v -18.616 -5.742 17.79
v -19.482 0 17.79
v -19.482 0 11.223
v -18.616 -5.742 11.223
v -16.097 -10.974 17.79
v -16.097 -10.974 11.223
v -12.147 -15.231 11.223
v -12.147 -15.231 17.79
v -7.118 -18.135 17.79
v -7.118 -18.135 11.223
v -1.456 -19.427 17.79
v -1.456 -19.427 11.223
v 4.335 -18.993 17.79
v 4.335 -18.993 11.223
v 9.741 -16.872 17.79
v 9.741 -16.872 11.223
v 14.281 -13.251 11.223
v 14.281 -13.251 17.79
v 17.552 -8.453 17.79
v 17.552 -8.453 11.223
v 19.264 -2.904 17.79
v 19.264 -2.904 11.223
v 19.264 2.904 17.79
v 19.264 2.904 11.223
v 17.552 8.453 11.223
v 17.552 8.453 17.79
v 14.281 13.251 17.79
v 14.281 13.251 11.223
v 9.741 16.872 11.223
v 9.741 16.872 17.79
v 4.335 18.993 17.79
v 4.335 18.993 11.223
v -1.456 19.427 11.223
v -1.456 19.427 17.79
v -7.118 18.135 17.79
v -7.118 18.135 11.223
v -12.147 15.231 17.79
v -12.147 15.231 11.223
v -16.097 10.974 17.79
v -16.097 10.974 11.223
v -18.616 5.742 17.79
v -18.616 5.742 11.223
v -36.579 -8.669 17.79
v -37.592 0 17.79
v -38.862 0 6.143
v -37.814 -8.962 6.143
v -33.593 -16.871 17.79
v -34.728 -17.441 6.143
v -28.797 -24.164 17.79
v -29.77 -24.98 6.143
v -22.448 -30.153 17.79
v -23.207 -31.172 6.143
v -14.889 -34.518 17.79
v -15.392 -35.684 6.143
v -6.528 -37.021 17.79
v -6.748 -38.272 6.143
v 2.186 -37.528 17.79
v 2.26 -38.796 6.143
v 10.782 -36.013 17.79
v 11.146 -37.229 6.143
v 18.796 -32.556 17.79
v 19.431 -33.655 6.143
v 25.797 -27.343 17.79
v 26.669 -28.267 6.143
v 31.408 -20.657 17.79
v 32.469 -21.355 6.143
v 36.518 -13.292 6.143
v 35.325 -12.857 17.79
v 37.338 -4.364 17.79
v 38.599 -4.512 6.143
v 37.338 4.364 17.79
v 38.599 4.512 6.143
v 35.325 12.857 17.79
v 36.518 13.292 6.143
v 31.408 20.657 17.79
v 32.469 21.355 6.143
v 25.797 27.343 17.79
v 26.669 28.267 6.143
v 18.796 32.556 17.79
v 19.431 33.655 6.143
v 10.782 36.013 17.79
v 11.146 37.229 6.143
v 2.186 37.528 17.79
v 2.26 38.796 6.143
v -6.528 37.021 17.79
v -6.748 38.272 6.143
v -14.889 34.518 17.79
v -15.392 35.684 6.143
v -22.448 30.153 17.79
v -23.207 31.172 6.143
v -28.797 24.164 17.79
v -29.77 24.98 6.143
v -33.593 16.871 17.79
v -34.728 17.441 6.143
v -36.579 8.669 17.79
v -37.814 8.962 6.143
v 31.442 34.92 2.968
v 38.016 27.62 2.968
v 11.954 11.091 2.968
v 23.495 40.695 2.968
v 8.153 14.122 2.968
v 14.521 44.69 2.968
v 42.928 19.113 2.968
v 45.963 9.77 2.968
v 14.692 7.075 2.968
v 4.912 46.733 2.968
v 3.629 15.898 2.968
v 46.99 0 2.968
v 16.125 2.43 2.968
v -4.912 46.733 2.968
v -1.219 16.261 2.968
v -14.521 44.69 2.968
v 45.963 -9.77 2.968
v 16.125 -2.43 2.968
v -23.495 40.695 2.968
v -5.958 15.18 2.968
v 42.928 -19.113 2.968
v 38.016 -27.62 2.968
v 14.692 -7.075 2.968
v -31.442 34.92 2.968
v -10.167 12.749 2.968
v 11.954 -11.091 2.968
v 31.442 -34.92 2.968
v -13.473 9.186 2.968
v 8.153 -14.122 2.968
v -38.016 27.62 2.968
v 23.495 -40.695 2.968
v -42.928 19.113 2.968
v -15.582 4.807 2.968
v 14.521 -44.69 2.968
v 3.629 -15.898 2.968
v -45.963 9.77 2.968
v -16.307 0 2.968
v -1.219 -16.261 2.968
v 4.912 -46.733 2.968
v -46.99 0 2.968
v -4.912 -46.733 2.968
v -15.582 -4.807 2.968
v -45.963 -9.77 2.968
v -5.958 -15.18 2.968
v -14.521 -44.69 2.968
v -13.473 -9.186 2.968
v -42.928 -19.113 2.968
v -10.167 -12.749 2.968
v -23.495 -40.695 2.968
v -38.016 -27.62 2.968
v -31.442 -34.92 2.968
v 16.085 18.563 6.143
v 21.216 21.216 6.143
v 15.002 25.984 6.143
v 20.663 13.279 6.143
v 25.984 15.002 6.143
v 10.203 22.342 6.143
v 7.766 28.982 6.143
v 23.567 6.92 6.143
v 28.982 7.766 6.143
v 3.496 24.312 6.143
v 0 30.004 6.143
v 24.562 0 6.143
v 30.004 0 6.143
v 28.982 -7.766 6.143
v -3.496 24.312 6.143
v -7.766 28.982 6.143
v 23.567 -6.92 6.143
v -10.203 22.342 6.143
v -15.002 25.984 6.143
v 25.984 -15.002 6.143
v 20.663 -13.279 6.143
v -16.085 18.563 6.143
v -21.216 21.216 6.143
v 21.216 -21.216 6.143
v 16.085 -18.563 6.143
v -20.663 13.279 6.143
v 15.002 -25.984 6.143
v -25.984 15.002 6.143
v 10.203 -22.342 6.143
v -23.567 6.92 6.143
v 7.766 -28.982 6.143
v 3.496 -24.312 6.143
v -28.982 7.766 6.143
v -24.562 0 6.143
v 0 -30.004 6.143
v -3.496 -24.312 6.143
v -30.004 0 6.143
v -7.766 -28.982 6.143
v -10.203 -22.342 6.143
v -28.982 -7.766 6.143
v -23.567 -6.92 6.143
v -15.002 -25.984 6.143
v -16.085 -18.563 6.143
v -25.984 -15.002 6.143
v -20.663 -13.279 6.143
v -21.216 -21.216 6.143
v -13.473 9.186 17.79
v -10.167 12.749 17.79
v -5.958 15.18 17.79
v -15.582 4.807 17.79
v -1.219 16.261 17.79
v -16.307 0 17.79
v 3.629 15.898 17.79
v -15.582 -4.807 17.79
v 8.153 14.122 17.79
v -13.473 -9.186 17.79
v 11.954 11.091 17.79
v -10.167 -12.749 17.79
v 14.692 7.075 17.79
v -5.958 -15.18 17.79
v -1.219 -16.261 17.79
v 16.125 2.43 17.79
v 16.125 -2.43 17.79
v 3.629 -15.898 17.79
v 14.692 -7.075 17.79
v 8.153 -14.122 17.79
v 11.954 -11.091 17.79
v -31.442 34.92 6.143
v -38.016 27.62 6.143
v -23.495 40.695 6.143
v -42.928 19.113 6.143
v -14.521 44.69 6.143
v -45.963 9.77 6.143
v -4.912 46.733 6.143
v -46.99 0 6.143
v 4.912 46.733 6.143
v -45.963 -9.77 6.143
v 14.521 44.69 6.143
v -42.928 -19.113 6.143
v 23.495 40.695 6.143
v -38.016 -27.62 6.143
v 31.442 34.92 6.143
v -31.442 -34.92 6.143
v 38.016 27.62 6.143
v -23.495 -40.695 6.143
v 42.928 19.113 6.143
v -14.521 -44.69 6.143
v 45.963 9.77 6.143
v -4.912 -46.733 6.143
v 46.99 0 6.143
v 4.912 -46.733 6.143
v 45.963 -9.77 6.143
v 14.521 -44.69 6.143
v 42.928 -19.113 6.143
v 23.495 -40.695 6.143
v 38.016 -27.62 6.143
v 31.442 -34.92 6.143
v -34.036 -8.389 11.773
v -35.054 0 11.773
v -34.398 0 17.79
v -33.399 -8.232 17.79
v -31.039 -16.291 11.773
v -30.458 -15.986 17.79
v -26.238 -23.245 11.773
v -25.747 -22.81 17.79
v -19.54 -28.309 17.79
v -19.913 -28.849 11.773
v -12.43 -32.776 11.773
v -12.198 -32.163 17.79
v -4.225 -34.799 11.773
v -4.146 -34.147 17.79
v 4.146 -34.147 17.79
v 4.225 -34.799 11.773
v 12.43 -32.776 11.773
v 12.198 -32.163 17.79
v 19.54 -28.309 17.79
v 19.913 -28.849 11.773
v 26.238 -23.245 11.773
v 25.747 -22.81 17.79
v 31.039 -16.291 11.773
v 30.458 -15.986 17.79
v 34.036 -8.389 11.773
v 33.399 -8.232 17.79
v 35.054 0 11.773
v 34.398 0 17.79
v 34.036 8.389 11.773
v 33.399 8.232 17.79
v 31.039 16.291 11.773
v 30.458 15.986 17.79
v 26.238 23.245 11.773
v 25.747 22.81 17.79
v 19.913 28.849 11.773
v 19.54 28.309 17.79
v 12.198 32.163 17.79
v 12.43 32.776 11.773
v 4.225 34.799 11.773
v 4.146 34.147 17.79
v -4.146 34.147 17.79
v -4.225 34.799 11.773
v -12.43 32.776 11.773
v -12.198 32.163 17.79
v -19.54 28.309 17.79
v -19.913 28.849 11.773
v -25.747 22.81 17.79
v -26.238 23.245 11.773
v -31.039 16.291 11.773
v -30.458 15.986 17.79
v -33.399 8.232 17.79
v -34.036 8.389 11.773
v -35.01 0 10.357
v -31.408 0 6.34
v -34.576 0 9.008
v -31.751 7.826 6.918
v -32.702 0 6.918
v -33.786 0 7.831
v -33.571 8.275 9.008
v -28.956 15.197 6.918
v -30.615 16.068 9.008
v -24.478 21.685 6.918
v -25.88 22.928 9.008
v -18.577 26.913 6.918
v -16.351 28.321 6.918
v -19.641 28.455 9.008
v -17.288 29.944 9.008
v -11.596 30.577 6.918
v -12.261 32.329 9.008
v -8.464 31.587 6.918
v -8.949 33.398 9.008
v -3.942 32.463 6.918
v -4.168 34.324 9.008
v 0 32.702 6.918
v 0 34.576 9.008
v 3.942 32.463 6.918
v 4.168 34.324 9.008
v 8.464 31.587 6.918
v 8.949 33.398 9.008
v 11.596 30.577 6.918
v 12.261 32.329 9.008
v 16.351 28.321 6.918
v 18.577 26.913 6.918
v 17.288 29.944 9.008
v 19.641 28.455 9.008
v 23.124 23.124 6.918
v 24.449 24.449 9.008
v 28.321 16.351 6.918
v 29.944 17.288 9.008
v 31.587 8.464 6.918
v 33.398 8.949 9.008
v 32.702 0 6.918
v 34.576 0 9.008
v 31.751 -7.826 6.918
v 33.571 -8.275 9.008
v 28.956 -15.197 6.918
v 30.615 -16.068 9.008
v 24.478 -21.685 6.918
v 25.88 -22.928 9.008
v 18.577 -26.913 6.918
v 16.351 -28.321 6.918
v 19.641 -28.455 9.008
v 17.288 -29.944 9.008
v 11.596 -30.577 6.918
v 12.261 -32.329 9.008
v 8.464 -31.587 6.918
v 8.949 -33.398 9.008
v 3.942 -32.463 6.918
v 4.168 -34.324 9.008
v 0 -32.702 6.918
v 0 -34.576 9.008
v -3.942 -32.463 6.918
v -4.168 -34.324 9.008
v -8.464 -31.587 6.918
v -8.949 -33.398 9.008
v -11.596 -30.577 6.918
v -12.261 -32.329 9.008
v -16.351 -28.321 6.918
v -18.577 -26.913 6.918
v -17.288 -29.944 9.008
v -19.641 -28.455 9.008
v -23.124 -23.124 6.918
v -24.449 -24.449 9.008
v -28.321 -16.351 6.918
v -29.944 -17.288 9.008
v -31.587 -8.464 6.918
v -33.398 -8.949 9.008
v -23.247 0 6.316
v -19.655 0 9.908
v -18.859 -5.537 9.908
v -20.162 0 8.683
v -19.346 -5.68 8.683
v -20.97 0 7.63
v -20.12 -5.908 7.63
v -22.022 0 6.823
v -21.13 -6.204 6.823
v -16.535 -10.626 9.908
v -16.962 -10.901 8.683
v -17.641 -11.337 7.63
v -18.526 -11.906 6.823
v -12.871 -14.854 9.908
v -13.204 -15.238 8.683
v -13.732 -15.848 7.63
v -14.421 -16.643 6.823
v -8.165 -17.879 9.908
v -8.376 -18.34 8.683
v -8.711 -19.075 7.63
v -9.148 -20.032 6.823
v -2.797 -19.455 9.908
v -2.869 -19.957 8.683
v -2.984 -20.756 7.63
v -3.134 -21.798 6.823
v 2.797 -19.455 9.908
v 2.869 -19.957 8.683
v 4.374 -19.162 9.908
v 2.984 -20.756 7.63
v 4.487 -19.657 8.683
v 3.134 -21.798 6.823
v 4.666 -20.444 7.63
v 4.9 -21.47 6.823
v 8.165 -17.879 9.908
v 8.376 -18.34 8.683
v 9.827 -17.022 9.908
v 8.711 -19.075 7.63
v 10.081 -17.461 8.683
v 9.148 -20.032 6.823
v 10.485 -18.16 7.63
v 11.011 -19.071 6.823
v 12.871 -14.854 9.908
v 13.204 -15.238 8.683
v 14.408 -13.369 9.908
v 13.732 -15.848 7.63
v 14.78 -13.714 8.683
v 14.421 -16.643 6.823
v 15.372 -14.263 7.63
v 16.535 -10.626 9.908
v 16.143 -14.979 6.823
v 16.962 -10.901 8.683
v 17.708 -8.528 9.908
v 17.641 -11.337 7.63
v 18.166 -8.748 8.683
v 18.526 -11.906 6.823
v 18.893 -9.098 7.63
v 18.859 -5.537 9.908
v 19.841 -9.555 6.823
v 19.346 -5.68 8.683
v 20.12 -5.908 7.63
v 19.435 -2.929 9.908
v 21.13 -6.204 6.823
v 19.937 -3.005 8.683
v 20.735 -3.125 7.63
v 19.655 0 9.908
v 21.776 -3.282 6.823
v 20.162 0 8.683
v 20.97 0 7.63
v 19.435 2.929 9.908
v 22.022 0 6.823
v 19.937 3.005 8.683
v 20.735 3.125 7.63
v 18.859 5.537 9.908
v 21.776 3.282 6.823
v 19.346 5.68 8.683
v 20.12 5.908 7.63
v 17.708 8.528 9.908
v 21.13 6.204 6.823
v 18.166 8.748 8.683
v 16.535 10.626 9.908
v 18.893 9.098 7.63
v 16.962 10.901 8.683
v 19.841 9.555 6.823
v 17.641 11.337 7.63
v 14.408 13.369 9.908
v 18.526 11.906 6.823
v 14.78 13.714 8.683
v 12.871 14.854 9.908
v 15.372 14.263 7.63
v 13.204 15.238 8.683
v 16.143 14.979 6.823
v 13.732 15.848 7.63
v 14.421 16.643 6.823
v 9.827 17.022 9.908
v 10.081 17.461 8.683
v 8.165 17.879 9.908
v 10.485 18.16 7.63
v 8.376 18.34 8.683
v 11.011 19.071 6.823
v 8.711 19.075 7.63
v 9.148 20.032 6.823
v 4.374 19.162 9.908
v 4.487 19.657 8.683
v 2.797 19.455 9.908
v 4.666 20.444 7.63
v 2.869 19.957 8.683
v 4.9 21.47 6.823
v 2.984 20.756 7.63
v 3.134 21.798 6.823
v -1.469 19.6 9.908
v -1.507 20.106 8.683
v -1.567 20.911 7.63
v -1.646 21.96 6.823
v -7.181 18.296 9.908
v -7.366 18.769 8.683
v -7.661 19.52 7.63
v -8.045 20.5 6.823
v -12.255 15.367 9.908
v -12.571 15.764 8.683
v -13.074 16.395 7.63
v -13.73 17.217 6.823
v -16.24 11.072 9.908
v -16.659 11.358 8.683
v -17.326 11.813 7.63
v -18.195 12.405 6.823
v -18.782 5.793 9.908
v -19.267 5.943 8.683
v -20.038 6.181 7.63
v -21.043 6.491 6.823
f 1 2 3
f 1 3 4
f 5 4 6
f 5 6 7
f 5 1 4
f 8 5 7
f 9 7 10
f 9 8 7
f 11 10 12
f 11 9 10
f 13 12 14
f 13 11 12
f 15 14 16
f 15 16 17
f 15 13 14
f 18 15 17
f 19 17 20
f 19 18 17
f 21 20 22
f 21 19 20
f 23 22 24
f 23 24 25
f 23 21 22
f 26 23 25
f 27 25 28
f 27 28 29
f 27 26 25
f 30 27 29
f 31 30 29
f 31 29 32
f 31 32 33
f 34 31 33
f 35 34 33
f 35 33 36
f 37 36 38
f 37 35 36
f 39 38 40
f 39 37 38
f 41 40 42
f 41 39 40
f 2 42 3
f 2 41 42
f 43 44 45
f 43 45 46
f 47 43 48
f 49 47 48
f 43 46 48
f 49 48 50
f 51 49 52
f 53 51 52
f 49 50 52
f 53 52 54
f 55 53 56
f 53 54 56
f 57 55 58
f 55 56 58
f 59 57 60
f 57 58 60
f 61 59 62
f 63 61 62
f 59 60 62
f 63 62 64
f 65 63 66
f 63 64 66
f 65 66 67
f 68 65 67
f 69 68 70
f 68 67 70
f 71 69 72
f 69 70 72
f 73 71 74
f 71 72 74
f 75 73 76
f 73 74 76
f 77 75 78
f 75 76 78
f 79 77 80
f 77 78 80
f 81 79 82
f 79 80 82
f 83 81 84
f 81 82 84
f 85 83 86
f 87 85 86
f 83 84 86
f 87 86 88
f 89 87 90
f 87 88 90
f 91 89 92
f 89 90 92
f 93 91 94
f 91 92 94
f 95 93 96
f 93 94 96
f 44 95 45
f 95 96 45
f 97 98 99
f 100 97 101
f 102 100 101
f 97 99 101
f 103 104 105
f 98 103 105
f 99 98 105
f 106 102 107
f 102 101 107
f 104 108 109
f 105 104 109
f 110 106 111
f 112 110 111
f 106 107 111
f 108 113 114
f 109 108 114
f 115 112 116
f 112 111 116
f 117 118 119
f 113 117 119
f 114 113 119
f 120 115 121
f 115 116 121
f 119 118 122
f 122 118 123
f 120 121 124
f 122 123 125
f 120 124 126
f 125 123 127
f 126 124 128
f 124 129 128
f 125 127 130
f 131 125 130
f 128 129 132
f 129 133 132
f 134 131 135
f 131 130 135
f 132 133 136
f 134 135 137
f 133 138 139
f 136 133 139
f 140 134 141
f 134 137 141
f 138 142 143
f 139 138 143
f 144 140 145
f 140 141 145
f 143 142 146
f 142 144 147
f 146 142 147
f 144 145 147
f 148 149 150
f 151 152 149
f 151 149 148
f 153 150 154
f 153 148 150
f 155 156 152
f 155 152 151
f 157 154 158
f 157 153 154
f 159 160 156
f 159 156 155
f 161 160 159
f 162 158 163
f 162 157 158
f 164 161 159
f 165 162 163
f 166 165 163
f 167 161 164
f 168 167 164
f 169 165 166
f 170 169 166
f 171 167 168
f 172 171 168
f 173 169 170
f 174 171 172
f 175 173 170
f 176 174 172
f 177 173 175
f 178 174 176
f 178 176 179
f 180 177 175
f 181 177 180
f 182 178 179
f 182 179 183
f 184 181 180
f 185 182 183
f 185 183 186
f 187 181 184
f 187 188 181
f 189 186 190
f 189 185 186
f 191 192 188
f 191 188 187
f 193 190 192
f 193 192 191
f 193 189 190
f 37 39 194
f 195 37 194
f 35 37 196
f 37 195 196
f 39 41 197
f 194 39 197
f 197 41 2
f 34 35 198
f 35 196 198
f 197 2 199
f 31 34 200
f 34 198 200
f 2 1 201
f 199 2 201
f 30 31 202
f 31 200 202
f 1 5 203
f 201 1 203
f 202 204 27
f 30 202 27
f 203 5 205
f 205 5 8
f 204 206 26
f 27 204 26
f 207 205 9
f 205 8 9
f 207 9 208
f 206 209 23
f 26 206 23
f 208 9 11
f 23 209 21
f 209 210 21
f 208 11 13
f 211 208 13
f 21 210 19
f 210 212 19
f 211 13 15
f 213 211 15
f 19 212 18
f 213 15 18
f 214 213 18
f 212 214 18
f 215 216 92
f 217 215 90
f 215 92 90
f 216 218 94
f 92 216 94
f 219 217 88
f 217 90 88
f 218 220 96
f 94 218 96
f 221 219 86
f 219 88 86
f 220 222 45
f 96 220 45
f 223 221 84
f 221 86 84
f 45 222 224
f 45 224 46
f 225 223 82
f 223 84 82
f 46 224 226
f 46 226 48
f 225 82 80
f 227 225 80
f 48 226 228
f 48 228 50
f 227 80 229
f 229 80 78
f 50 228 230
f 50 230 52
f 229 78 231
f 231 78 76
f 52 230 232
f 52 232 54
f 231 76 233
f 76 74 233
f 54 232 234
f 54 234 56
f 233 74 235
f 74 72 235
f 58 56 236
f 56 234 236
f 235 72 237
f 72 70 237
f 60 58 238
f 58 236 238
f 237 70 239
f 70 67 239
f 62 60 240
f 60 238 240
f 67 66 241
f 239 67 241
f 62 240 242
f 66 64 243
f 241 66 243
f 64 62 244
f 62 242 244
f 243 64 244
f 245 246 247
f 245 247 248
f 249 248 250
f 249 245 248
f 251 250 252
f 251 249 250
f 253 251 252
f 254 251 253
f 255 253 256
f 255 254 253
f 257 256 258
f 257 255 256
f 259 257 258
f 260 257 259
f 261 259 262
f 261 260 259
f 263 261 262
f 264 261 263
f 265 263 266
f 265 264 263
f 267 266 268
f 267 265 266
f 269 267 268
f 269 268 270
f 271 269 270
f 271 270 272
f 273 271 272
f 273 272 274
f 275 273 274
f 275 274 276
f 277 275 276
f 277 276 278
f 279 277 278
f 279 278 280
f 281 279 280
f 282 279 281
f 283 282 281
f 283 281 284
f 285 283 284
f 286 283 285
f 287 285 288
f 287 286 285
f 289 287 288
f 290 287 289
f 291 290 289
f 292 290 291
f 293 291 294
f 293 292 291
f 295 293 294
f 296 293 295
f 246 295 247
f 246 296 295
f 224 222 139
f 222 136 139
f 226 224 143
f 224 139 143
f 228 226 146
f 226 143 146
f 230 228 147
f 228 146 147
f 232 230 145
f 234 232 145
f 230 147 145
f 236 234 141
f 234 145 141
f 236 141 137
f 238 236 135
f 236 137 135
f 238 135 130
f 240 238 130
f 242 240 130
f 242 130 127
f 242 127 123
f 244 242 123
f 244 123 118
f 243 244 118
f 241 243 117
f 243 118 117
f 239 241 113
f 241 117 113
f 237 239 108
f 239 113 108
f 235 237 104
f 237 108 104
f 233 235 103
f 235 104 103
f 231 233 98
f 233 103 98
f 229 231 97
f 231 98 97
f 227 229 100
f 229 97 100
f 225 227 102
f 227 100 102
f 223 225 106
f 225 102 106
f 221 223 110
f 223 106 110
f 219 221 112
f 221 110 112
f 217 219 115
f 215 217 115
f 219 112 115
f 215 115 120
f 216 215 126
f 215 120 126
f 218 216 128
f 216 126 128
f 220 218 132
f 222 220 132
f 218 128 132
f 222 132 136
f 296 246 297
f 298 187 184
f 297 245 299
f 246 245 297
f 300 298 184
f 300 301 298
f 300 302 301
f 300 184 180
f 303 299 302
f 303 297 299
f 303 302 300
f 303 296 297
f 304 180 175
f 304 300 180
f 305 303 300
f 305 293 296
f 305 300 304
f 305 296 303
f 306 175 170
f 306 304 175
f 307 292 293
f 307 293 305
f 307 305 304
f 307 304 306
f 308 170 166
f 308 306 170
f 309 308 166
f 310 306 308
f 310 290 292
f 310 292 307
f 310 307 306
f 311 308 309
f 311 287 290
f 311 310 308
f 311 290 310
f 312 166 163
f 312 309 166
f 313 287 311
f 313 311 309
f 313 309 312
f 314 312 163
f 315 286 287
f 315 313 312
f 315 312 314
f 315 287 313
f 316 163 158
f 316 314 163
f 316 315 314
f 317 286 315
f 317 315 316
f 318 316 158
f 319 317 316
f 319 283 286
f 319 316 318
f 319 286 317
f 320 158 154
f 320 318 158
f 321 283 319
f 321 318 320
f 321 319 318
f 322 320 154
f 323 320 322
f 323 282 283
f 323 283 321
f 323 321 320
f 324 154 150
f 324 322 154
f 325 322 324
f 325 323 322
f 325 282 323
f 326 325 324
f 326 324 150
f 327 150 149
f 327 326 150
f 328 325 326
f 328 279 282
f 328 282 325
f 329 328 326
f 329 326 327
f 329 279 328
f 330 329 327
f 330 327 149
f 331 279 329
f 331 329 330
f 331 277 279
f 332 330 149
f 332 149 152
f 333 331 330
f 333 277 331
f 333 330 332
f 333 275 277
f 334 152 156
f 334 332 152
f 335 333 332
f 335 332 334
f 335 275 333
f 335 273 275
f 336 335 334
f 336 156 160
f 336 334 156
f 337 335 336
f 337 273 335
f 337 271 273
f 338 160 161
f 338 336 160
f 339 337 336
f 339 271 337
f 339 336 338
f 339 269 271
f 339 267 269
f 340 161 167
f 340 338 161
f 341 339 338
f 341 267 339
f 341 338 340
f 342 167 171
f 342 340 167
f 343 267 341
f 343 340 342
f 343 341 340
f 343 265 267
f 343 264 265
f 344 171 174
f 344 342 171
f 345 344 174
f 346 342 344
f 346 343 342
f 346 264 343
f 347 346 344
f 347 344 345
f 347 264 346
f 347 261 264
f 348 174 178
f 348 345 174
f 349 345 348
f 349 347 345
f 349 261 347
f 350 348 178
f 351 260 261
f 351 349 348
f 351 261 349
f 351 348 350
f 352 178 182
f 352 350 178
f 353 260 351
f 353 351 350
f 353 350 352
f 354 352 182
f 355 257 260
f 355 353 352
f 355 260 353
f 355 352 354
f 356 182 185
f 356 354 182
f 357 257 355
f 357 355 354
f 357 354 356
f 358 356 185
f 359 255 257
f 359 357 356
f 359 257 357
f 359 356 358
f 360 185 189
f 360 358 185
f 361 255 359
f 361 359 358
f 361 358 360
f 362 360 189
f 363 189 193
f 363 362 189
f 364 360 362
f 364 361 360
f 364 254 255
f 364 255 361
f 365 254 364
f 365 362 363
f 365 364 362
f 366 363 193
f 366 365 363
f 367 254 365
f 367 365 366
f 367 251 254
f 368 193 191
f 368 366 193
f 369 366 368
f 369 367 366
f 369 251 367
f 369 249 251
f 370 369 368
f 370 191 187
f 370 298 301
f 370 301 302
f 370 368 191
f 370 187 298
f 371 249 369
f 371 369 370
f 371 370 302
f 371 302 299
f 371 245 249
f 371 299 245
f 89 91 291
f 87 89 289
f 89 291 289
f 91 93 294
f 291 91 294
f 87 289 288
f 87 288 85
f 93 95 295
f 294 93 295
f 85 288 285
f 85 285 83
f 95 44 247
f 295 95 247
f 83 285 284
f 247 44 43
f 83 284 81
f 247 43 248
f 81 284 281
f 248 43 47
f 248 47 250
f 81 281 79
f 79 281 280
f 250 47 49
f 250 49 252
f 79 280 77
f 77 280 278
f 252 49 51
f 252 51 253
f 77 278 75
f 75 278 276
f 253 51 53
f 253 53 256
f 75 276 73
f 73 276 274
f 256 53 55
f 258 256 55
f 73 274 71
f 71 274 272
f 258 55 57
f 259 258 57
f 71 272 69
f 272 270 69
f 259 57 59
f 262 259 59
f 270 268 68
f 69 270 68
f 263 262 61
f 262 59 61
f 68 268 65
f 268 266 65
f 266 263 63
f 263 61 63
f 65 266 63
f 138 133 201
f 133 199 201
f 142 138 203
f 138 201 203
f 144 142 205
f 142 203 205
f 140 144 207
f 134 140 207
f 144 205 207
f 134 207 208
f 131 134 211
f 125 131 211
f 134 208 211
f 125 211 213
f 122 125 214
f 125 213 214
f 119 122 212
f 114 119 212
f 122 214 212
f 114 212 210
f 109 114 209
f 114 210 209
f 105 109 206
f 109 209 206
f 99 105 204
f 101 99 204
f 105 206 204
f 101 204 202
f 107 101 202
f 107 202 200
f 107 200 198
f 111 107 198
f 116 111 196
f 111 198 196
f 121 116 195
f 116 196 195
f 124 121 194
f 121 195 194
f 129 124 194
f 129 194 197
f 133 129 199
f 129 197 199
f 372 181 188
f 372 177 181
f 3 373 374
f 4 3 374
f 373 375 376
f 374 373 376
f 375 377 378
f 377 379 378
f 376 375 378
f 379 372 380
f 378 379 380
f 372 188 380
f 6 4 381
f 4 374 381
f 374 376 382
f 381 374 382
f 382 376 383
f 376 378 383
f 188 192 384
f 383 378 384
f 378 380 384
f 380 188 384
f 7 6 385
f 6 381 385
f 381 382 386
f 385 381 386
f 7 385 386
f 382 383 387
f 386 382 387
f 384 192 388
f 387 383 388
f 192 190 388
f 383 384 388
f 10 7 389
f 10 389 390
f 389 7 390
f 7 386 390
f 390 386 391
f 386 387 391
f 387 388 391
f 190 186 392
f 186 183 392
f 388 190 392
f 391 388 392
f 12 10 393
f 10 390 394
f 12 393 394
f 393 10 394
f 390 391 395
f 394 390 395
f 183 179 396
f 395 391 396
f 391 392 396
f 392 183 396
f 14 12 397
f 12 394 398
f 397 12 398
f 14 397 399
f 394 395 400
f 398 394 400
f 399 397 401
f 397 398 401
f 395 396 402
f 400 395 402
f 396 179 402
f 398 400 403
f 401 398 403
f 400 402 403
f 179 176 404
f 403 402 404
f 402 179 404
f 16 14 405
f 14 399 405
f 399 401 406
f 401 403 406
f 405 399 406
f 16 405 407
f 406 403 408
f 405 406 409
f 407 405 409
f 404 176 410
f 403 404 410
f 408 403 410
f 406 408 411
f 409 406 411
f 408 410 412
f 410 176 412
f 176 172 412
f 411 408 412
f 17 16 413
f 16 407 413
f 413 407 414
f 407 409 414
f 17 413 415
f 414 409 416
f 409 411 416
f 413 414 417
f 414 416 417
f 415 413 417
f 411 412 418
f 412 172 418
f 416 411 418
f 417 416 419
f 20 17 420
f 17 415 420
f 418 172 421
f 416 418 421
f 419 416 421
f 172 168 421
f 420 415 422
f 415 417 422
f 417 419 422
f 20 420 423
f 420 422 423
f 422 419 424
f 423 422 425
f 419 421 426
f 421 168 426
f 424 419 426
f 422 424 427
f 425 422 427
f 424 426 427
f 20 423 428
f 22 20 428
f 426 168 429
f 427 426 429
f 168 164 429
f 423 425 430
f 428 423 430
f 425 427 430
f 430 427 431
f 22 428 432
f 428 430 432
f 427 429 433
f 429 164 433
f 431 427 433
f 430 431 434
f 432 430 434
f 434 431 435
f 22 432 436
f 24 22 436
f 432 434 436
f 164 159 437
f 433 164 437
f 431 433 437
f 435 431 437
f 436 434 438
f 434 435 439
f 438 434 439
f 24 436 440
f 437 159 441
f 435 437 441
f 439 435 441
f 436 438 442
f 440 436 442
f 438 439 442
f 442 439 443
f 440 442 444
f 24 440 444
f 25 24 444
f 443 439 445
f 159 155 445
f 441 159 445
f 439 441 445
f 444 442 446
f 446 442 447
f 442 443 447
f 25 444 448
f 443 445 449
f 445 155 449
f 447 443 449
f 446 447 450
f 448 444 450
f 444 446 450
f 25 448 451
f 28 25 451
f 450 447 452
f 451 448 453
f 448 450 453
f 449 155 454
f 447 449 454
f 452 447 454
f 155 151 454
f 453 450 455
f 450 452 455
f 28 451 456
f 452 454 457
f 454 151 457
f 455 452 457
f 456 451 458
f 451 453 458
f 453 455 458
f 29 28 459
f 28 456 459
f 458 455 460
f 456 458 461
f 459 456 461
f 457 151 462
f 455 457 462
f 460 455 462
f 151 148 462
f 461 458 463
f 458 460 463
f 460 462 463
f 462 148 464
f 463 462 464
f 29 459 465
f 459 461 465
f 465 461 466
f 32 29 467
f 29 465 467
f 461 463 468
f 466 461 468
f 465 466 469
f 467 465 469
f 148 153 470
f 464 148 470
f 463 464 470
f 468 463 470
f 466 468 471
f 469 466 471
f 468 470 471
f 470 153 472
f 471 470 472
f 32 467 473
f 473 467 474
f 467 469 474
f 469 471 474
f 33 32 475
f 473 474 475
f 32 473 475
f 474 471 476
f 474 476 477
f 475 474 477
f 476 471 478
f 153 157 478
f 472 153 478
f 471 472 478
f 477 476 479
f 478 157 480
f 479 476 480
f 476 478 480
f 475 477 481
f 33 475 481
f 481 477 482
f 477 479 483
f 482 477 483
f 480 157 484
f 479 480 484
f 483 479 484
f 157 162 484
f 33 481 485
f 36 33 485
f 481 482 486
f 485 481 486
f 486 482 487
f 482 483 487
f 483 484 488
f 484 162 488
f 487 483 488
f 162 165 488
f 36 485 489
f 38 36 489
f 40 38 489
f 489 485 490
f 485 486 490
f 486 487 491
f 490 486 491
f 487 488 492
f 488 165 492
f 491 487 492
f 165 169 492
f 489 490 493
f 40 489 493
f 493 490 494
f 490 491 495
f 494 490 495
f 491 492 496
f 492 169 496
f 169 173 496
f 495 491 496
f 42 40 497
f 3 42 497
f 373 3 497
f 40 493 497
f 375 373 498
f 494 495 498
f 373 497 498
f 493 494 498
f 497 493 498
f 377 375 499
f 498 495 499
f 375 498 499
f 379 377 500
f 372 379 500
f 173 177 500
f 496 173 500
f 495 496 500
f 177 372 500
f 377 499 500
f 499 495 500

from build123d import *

# Parameters (mm, degrees)
F2_T = -3.175
F3_R = 5.08
F4_R = 5.08


with BuildPart() as f1:
    # F0 (on Front) → F1 (revolve)
    with BuildSketch(Plane.XZ):
        Polygon((-16.3068, 2.9675877146), (-16.3068, 17.7895731165), (-37.592, 17.7895731165), (-38.862, 6.1425877146), (-46.99, 6.1425877146), (-46.99, 2.9675877146), align=None)
    revolve(axis=Axis((0, 0, 15.8357990333), (0, 0, 1)))

    # F2
    f2_openings = [f1.faces().sort_by_distance(p)[0] for p in [
        (17.370062, 0, 17.789573),
    ]]
    offset(amount=F2_T, openings=f2_openings)

    # F3
    f3_edges = [f1.edges().sort_by_distance(p)[0] for p in [
        (19.4818, 0, 6.142588),
    ]]
    fillet(f3_edges, radius=F3_R)

    # F4
    f4_edges = [f1.edges().sort_by_distance(p)[0] for p in [
        (35.66818, 0, 6.142588),
    ]]
    fillet(f4_edges, radius=F4_R)


solid = f1.part
